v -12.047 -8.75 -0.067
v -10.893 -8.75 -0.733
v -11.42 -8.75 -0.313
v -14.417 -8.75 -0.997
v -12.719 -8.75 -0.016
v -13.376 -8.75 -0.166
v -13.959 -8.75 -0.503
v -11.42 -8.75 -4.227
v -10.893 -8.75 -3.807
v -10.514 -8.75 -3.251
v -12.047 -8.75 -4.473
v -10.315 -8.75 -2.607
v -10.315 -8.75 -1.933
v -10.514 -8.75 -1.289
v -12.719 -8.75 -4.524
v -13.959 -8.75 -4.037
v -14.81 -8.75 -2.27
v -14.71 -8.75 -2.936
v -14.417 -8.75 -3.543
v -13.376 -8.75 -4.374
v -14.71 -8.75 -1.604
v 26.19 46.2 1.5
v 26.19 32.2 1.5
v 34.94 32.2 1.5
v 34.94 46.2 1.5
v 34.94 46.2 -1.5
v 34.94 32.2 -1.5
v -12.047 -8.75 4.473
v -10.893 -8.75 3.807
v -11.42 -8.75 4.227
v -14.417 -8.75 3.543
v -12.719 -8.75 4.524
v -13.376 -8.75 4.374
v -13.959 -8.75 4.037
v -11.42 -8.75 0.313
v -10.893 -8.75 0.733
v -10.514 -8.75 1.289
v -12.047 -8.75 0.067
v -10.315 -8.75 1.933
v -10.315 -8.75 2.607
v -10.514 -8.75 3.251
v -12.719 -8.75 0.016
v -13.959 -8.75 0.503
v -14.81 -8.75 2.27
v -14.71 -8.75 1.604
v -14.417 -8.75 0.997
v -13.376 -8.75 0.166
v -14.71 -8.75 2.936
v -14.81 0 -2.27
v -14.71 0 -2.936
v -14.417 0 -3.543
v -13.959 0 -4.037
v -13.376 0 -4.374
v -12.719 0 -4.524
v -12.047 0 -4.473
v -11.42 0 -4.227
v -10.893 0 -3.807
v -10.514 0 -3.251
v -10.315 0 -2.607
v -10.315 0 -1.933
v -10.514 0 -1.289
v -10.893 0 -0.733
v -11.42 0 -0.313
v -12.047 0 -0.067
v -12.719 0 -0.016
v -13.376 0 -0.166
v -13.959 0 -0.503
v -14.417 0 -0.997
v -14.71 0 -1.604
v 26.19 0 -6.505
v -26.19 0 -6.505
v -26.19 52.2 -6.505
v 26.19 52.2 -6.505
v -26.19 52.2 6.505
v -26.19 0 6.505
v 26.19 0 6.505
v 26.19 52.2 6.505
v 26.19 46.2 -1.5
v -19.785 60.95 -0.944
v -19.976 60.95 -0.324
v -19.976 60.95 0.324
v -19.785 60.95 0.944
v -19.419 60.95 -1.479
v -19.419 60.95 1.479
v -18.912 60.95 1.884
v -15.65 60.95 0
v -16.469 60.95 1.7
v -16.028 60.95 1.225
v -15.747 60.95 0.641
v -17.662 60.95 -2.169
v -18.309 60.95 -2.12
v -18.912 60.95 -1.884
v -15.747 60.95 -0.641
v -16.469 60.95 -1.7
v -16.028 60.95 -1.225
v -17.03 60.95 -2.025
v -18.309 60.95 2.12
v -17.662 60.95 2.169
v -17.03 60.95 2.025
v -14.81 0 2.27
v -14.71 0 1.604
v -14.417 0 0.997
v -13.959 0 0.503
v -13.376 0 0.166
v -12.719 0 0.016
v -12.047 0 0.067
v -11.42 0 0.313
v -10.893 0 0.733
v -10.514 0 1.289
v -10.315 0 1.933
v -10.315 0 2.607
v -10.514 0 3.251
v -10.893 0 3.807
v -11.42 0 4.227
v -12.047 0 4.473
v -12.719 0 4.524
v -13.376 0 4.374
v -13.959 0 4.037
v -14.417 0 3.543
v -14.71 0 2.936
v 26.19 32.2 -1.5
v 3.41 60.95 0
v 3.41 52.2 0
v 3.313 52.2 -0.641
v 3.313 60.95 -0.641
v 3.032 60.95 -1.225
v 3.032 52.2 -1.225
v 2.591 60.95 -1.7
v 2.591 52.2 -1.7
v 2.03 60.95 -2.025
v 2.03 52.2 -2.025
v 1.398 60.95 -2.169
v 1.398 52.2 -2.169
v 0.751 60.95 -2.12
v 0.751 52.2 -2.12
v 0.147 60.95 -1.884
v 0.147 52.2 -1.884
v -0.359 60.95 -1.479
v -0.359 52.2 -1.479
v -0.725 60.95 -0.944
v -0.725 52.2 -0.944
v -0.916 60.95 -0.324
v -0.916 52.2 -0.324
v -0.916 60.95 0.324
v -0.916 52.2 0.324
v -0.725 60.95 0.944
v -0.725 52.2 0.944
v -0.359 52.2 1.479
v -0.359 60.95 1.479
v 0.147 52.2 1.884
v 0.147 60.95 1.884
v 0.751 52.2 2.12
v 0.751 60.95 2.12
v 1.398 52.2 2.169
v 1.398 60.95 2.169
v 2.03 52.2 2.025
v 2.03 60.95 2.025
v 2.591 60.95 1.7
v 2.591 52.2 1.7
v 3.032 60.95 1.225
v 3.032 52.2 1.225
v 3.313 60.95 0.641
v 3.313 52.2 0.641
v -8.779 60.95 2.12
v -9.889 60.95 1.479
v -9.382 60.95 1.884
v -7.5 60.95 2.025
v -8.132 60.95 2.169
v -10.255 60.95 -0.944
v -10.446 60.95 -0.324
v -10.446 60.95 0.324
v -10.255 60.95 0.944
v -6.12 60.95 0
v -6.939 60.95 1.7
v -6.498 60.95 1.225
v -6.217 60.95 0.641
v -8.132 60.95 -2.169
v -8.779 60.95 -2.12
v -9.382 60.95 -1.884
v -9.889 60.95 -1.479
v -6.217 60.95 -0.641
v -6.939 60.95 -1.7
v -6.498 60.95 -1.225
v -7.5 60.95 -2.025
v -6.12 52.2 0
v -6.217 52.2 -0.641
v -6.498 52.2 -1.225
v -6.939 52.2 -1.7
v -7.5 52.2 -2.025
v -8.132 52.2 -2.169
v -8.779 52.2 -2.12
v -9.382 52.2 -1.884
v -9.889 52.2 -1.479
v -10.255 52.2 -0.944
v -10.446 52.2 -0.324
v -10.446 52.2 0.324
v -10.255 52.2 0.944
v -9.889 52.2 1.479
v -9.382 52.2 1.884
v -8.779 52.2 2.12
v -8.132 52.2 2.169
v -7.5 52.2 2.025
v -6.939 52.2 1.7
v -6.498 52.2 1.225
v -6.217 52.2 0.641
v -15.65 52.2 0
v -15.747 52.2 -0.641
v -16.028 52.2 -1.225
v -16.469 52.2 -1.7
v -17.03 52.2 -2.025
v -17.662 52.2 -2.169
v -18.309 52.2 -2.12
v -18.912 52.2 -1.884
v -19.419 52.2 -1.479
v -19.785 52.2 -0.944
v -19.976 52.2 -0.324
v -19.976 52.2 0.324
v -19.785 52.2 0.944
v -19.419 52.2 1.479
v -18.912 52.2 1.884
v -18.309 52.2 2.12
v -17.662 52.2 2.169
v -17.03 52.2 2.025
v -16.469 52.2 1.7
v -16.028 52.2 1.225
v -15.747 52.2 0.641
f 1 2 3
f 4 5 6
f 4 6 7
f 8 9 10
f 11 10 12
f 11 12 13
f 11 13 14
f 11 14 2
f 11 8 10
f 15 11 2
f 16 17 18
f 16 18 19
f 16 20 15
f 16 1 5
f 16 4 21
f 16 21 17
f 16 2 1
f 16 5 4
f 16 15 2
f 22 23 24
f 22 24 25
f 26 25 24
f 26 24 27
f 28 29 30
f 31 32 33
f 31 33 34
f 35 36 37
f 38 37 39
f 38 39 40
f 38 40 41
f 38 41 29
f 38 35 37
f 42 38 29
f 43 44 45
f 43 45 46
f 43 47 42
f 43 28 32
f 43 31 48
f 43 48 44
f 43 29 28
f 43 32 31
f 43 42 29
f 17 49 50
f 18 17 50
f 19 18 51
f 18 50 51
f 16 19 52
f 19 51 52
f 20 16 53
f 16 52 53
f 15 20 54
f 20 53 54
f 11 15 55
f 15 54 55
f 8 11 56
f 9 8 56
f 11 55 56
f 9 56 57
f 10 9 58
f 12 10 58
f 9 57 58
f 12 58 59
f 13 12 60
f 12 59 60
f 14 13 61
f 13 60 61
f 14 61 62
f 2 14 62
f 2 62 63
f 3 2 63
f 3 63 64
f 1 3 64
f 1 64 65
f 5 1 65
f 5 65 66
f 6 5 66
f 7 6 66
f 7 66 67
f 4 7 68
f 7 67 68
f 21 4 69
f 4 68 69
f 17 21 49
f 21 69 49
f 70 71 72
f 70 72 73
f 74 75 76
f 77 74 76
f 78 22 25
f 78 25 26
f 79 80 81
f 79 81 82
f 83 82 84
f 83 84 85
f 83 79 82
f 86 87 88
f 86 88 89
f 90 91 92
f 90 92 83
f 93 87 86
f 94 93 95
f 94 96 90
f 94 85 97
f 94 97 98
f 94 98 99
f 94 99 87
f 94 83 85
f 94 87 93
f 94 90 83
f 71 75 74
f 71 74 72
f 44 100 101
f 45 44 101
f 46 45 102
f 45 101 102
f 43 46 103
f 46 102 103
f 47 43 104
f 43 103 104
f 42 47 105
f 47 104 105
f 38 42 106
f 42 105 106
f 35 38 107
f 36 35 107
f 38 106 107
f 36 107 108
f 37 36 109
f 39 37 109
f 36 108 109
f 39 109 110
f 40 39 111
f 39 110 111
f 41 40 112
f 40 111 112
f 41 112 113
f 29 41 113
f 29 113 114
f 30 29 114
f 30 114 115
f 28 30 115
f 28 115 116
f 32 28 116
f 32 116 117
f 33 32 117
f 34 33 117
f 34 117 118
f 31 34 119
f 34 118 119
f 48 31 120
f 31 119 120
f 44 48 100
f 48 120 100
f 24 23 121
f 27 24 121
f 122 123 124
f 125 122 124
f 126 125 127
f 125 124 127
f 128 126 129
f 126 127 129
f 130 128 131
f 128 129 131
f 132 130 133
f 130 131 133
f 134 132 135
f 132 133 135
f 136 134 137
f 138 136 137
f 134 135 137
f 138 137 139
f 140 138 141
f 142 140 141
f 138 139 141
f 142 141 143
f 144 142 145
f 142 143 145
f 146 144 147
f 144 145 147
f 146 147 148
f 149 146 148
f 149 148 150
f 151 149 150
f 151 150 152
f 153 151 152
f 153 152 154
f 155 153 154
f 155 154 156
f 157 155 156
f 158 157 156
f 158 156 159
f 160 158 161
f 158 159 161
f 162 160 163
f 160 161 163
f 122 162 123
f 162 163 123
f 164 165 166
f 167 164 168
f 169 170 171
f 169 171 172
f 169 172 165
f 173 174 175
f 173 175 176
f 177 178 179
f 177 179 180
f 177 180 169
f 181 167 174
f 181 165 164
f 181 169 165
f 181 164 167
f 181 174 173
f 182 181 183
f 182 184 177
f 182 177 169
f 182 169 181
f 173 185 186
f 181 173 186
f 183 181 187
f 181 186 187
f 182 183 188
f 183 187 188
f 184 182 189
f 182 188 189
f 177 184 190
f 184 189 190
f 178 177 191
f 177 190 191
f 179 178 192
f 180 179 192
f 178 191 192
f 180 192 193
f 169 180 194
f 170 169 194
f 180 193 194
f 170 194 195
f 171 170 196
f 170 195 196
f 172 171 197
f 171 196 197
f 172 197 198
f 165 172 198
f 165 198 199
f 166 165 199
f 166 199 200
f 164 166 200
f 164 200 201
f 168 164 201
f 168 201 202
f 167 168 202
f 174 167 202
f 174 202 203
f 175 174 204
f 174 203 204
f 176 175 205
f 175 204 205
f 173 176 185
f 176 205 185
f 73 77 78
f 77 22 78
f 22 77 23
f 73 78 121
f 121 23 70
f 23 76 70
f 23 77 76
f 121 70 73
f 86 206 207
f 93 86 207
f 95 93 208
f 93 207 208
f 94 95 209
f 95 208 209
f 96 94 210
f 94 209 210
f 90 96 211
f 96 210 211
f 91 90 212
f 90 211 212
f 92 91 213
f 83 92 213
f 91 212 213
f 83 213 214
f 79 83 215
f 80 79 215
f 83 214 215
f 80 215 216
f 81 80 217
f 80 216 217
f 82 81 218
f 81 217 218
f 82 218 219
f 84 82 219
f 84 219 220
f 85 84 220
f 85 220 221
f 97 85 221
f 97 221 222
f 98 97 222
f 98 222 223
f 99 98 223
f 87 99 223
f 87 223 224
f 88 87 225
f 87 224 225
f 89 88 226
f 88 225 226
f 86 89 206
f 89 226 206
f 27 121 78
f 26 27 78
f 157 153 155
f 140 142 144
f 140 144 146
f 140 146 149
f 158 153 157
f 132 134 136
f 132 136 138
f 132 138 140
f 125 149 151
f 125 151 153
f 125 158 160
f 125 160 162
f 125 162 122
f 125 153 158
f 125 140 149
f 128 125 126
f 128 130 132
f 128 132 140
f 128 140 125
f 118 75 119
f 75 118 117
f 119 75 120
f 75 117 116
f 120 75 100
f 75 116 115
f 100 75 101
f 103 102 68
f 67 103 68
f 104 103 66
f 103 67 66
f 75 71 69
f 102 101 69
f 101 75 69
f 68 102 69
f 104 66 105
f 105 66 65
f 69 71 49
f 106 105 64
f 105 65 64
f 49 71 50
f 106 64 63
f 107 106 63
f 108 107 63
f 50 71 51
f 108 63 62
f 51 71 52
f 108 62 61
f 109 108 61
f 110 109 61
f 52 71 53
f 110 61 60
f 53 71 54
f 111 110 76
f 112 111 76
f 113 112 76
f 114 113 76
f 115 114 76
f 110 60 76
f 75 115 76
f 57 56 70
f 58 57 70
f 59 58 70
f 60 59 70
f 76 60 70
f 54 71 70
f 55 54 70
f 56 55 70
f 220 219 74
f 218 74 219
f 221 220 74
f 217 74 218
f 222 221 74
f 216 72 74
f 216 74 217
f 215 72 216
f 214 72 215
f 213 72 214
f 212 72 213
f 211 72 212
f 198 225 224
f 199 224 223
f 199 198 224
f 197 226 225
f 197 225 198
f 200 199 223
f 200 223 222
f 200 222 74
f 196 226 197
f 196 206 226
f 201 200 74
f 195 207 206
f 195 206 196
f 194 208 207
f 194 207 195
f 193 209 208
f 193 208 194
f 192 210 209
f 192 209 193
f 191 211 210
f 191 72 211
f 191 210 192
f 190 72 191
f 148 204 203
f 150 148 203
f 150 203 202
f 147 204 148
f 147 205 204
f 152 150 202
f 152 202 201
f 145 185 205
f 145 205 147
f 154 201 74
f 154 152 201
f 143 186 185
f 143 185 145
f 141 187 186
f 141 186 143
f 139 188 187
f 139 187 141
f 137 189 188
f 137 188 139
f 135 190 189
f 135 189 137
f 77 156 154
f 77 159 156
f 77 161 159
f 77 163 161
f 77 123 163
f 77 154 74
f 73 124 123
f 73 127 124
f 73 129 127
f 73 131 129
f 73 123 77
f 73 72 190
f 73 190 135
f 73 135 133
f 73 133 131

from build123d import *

# Parameters (mm, degrees)
SKETCH1_W           = 52.38
SKETCH1_H           = 13.01
BOSS_EXTRUDE1_DEPTH = 52.2
SKETCH2_R           = 2.26
BOSS_EXTRUDE6_DEPTH = 8.75
SKETCH3_R           = 2.175
BOSS_EXTRUDE7_DEPTH = 8.75
SKETCH4_W           = 3
SKETCH4_H           = 14
BOSS_EXTRUDE8_DEPTH = 8.75


with BuildPart() as part:
    # Sketch1 → Boss-Extrude1 (new body)
    with BuildSketch(Plane(origin=(0, 0, 0), x_dir=(1, 0, 0), z_dir=(0, 1, 0))):
        Rectangle(SKETCH1_W, SKETCH1_H)
    extrude(amount=BOSS_EXTRUDE1_DEPTH)

    # Sketch2 → Boss-Extrude6 (add)
    with BuildSketch(Plane(origin=(0, 0, 0), x_dir=(-1, 0, 0), z_dir=(0, -1, 0))):
        with Locations((12.55, -2.27)):
            Circle(SKETCH2_R)
        with Locations((12.55, 2.27)):
            Circle(SKETCH2_R)
    extrude(amount=BOSS_EXTRUDE6_DEPTH)

    # Sketch3 → Boss-Extrude7 (add)
    with BuildSketch(Plane(origin=(0, 52.2, 0), x_dir=(1, 0, 0), z_dir=(0, 1, 0))):
        with Locations((-17.825, 0)):
            Circle(SKETCH3_R)
        with Locations((-8.295, 0)):
            Circle(SKETCH3_R)
        with Locations((1.235, 0)):
            Circle(SKETCH3_R)
    extrude(amount=BOSS_EXTRUDE7_DEPTH)

    # Sketch4 → Boss-Extrude8 (add)
    with BuildSketch(Plane(origin=(26.19, 0, 0), x_dir=(0, 0, -1), z_dir=(1, 0, 0))):
        with Locations((0, 39.2)):
            Rectangle(SKETCH4_W, SKETCH4_H)
    extrude(amount=BOSS_EXTRUDE8_DEPTH)


solid = part.part
